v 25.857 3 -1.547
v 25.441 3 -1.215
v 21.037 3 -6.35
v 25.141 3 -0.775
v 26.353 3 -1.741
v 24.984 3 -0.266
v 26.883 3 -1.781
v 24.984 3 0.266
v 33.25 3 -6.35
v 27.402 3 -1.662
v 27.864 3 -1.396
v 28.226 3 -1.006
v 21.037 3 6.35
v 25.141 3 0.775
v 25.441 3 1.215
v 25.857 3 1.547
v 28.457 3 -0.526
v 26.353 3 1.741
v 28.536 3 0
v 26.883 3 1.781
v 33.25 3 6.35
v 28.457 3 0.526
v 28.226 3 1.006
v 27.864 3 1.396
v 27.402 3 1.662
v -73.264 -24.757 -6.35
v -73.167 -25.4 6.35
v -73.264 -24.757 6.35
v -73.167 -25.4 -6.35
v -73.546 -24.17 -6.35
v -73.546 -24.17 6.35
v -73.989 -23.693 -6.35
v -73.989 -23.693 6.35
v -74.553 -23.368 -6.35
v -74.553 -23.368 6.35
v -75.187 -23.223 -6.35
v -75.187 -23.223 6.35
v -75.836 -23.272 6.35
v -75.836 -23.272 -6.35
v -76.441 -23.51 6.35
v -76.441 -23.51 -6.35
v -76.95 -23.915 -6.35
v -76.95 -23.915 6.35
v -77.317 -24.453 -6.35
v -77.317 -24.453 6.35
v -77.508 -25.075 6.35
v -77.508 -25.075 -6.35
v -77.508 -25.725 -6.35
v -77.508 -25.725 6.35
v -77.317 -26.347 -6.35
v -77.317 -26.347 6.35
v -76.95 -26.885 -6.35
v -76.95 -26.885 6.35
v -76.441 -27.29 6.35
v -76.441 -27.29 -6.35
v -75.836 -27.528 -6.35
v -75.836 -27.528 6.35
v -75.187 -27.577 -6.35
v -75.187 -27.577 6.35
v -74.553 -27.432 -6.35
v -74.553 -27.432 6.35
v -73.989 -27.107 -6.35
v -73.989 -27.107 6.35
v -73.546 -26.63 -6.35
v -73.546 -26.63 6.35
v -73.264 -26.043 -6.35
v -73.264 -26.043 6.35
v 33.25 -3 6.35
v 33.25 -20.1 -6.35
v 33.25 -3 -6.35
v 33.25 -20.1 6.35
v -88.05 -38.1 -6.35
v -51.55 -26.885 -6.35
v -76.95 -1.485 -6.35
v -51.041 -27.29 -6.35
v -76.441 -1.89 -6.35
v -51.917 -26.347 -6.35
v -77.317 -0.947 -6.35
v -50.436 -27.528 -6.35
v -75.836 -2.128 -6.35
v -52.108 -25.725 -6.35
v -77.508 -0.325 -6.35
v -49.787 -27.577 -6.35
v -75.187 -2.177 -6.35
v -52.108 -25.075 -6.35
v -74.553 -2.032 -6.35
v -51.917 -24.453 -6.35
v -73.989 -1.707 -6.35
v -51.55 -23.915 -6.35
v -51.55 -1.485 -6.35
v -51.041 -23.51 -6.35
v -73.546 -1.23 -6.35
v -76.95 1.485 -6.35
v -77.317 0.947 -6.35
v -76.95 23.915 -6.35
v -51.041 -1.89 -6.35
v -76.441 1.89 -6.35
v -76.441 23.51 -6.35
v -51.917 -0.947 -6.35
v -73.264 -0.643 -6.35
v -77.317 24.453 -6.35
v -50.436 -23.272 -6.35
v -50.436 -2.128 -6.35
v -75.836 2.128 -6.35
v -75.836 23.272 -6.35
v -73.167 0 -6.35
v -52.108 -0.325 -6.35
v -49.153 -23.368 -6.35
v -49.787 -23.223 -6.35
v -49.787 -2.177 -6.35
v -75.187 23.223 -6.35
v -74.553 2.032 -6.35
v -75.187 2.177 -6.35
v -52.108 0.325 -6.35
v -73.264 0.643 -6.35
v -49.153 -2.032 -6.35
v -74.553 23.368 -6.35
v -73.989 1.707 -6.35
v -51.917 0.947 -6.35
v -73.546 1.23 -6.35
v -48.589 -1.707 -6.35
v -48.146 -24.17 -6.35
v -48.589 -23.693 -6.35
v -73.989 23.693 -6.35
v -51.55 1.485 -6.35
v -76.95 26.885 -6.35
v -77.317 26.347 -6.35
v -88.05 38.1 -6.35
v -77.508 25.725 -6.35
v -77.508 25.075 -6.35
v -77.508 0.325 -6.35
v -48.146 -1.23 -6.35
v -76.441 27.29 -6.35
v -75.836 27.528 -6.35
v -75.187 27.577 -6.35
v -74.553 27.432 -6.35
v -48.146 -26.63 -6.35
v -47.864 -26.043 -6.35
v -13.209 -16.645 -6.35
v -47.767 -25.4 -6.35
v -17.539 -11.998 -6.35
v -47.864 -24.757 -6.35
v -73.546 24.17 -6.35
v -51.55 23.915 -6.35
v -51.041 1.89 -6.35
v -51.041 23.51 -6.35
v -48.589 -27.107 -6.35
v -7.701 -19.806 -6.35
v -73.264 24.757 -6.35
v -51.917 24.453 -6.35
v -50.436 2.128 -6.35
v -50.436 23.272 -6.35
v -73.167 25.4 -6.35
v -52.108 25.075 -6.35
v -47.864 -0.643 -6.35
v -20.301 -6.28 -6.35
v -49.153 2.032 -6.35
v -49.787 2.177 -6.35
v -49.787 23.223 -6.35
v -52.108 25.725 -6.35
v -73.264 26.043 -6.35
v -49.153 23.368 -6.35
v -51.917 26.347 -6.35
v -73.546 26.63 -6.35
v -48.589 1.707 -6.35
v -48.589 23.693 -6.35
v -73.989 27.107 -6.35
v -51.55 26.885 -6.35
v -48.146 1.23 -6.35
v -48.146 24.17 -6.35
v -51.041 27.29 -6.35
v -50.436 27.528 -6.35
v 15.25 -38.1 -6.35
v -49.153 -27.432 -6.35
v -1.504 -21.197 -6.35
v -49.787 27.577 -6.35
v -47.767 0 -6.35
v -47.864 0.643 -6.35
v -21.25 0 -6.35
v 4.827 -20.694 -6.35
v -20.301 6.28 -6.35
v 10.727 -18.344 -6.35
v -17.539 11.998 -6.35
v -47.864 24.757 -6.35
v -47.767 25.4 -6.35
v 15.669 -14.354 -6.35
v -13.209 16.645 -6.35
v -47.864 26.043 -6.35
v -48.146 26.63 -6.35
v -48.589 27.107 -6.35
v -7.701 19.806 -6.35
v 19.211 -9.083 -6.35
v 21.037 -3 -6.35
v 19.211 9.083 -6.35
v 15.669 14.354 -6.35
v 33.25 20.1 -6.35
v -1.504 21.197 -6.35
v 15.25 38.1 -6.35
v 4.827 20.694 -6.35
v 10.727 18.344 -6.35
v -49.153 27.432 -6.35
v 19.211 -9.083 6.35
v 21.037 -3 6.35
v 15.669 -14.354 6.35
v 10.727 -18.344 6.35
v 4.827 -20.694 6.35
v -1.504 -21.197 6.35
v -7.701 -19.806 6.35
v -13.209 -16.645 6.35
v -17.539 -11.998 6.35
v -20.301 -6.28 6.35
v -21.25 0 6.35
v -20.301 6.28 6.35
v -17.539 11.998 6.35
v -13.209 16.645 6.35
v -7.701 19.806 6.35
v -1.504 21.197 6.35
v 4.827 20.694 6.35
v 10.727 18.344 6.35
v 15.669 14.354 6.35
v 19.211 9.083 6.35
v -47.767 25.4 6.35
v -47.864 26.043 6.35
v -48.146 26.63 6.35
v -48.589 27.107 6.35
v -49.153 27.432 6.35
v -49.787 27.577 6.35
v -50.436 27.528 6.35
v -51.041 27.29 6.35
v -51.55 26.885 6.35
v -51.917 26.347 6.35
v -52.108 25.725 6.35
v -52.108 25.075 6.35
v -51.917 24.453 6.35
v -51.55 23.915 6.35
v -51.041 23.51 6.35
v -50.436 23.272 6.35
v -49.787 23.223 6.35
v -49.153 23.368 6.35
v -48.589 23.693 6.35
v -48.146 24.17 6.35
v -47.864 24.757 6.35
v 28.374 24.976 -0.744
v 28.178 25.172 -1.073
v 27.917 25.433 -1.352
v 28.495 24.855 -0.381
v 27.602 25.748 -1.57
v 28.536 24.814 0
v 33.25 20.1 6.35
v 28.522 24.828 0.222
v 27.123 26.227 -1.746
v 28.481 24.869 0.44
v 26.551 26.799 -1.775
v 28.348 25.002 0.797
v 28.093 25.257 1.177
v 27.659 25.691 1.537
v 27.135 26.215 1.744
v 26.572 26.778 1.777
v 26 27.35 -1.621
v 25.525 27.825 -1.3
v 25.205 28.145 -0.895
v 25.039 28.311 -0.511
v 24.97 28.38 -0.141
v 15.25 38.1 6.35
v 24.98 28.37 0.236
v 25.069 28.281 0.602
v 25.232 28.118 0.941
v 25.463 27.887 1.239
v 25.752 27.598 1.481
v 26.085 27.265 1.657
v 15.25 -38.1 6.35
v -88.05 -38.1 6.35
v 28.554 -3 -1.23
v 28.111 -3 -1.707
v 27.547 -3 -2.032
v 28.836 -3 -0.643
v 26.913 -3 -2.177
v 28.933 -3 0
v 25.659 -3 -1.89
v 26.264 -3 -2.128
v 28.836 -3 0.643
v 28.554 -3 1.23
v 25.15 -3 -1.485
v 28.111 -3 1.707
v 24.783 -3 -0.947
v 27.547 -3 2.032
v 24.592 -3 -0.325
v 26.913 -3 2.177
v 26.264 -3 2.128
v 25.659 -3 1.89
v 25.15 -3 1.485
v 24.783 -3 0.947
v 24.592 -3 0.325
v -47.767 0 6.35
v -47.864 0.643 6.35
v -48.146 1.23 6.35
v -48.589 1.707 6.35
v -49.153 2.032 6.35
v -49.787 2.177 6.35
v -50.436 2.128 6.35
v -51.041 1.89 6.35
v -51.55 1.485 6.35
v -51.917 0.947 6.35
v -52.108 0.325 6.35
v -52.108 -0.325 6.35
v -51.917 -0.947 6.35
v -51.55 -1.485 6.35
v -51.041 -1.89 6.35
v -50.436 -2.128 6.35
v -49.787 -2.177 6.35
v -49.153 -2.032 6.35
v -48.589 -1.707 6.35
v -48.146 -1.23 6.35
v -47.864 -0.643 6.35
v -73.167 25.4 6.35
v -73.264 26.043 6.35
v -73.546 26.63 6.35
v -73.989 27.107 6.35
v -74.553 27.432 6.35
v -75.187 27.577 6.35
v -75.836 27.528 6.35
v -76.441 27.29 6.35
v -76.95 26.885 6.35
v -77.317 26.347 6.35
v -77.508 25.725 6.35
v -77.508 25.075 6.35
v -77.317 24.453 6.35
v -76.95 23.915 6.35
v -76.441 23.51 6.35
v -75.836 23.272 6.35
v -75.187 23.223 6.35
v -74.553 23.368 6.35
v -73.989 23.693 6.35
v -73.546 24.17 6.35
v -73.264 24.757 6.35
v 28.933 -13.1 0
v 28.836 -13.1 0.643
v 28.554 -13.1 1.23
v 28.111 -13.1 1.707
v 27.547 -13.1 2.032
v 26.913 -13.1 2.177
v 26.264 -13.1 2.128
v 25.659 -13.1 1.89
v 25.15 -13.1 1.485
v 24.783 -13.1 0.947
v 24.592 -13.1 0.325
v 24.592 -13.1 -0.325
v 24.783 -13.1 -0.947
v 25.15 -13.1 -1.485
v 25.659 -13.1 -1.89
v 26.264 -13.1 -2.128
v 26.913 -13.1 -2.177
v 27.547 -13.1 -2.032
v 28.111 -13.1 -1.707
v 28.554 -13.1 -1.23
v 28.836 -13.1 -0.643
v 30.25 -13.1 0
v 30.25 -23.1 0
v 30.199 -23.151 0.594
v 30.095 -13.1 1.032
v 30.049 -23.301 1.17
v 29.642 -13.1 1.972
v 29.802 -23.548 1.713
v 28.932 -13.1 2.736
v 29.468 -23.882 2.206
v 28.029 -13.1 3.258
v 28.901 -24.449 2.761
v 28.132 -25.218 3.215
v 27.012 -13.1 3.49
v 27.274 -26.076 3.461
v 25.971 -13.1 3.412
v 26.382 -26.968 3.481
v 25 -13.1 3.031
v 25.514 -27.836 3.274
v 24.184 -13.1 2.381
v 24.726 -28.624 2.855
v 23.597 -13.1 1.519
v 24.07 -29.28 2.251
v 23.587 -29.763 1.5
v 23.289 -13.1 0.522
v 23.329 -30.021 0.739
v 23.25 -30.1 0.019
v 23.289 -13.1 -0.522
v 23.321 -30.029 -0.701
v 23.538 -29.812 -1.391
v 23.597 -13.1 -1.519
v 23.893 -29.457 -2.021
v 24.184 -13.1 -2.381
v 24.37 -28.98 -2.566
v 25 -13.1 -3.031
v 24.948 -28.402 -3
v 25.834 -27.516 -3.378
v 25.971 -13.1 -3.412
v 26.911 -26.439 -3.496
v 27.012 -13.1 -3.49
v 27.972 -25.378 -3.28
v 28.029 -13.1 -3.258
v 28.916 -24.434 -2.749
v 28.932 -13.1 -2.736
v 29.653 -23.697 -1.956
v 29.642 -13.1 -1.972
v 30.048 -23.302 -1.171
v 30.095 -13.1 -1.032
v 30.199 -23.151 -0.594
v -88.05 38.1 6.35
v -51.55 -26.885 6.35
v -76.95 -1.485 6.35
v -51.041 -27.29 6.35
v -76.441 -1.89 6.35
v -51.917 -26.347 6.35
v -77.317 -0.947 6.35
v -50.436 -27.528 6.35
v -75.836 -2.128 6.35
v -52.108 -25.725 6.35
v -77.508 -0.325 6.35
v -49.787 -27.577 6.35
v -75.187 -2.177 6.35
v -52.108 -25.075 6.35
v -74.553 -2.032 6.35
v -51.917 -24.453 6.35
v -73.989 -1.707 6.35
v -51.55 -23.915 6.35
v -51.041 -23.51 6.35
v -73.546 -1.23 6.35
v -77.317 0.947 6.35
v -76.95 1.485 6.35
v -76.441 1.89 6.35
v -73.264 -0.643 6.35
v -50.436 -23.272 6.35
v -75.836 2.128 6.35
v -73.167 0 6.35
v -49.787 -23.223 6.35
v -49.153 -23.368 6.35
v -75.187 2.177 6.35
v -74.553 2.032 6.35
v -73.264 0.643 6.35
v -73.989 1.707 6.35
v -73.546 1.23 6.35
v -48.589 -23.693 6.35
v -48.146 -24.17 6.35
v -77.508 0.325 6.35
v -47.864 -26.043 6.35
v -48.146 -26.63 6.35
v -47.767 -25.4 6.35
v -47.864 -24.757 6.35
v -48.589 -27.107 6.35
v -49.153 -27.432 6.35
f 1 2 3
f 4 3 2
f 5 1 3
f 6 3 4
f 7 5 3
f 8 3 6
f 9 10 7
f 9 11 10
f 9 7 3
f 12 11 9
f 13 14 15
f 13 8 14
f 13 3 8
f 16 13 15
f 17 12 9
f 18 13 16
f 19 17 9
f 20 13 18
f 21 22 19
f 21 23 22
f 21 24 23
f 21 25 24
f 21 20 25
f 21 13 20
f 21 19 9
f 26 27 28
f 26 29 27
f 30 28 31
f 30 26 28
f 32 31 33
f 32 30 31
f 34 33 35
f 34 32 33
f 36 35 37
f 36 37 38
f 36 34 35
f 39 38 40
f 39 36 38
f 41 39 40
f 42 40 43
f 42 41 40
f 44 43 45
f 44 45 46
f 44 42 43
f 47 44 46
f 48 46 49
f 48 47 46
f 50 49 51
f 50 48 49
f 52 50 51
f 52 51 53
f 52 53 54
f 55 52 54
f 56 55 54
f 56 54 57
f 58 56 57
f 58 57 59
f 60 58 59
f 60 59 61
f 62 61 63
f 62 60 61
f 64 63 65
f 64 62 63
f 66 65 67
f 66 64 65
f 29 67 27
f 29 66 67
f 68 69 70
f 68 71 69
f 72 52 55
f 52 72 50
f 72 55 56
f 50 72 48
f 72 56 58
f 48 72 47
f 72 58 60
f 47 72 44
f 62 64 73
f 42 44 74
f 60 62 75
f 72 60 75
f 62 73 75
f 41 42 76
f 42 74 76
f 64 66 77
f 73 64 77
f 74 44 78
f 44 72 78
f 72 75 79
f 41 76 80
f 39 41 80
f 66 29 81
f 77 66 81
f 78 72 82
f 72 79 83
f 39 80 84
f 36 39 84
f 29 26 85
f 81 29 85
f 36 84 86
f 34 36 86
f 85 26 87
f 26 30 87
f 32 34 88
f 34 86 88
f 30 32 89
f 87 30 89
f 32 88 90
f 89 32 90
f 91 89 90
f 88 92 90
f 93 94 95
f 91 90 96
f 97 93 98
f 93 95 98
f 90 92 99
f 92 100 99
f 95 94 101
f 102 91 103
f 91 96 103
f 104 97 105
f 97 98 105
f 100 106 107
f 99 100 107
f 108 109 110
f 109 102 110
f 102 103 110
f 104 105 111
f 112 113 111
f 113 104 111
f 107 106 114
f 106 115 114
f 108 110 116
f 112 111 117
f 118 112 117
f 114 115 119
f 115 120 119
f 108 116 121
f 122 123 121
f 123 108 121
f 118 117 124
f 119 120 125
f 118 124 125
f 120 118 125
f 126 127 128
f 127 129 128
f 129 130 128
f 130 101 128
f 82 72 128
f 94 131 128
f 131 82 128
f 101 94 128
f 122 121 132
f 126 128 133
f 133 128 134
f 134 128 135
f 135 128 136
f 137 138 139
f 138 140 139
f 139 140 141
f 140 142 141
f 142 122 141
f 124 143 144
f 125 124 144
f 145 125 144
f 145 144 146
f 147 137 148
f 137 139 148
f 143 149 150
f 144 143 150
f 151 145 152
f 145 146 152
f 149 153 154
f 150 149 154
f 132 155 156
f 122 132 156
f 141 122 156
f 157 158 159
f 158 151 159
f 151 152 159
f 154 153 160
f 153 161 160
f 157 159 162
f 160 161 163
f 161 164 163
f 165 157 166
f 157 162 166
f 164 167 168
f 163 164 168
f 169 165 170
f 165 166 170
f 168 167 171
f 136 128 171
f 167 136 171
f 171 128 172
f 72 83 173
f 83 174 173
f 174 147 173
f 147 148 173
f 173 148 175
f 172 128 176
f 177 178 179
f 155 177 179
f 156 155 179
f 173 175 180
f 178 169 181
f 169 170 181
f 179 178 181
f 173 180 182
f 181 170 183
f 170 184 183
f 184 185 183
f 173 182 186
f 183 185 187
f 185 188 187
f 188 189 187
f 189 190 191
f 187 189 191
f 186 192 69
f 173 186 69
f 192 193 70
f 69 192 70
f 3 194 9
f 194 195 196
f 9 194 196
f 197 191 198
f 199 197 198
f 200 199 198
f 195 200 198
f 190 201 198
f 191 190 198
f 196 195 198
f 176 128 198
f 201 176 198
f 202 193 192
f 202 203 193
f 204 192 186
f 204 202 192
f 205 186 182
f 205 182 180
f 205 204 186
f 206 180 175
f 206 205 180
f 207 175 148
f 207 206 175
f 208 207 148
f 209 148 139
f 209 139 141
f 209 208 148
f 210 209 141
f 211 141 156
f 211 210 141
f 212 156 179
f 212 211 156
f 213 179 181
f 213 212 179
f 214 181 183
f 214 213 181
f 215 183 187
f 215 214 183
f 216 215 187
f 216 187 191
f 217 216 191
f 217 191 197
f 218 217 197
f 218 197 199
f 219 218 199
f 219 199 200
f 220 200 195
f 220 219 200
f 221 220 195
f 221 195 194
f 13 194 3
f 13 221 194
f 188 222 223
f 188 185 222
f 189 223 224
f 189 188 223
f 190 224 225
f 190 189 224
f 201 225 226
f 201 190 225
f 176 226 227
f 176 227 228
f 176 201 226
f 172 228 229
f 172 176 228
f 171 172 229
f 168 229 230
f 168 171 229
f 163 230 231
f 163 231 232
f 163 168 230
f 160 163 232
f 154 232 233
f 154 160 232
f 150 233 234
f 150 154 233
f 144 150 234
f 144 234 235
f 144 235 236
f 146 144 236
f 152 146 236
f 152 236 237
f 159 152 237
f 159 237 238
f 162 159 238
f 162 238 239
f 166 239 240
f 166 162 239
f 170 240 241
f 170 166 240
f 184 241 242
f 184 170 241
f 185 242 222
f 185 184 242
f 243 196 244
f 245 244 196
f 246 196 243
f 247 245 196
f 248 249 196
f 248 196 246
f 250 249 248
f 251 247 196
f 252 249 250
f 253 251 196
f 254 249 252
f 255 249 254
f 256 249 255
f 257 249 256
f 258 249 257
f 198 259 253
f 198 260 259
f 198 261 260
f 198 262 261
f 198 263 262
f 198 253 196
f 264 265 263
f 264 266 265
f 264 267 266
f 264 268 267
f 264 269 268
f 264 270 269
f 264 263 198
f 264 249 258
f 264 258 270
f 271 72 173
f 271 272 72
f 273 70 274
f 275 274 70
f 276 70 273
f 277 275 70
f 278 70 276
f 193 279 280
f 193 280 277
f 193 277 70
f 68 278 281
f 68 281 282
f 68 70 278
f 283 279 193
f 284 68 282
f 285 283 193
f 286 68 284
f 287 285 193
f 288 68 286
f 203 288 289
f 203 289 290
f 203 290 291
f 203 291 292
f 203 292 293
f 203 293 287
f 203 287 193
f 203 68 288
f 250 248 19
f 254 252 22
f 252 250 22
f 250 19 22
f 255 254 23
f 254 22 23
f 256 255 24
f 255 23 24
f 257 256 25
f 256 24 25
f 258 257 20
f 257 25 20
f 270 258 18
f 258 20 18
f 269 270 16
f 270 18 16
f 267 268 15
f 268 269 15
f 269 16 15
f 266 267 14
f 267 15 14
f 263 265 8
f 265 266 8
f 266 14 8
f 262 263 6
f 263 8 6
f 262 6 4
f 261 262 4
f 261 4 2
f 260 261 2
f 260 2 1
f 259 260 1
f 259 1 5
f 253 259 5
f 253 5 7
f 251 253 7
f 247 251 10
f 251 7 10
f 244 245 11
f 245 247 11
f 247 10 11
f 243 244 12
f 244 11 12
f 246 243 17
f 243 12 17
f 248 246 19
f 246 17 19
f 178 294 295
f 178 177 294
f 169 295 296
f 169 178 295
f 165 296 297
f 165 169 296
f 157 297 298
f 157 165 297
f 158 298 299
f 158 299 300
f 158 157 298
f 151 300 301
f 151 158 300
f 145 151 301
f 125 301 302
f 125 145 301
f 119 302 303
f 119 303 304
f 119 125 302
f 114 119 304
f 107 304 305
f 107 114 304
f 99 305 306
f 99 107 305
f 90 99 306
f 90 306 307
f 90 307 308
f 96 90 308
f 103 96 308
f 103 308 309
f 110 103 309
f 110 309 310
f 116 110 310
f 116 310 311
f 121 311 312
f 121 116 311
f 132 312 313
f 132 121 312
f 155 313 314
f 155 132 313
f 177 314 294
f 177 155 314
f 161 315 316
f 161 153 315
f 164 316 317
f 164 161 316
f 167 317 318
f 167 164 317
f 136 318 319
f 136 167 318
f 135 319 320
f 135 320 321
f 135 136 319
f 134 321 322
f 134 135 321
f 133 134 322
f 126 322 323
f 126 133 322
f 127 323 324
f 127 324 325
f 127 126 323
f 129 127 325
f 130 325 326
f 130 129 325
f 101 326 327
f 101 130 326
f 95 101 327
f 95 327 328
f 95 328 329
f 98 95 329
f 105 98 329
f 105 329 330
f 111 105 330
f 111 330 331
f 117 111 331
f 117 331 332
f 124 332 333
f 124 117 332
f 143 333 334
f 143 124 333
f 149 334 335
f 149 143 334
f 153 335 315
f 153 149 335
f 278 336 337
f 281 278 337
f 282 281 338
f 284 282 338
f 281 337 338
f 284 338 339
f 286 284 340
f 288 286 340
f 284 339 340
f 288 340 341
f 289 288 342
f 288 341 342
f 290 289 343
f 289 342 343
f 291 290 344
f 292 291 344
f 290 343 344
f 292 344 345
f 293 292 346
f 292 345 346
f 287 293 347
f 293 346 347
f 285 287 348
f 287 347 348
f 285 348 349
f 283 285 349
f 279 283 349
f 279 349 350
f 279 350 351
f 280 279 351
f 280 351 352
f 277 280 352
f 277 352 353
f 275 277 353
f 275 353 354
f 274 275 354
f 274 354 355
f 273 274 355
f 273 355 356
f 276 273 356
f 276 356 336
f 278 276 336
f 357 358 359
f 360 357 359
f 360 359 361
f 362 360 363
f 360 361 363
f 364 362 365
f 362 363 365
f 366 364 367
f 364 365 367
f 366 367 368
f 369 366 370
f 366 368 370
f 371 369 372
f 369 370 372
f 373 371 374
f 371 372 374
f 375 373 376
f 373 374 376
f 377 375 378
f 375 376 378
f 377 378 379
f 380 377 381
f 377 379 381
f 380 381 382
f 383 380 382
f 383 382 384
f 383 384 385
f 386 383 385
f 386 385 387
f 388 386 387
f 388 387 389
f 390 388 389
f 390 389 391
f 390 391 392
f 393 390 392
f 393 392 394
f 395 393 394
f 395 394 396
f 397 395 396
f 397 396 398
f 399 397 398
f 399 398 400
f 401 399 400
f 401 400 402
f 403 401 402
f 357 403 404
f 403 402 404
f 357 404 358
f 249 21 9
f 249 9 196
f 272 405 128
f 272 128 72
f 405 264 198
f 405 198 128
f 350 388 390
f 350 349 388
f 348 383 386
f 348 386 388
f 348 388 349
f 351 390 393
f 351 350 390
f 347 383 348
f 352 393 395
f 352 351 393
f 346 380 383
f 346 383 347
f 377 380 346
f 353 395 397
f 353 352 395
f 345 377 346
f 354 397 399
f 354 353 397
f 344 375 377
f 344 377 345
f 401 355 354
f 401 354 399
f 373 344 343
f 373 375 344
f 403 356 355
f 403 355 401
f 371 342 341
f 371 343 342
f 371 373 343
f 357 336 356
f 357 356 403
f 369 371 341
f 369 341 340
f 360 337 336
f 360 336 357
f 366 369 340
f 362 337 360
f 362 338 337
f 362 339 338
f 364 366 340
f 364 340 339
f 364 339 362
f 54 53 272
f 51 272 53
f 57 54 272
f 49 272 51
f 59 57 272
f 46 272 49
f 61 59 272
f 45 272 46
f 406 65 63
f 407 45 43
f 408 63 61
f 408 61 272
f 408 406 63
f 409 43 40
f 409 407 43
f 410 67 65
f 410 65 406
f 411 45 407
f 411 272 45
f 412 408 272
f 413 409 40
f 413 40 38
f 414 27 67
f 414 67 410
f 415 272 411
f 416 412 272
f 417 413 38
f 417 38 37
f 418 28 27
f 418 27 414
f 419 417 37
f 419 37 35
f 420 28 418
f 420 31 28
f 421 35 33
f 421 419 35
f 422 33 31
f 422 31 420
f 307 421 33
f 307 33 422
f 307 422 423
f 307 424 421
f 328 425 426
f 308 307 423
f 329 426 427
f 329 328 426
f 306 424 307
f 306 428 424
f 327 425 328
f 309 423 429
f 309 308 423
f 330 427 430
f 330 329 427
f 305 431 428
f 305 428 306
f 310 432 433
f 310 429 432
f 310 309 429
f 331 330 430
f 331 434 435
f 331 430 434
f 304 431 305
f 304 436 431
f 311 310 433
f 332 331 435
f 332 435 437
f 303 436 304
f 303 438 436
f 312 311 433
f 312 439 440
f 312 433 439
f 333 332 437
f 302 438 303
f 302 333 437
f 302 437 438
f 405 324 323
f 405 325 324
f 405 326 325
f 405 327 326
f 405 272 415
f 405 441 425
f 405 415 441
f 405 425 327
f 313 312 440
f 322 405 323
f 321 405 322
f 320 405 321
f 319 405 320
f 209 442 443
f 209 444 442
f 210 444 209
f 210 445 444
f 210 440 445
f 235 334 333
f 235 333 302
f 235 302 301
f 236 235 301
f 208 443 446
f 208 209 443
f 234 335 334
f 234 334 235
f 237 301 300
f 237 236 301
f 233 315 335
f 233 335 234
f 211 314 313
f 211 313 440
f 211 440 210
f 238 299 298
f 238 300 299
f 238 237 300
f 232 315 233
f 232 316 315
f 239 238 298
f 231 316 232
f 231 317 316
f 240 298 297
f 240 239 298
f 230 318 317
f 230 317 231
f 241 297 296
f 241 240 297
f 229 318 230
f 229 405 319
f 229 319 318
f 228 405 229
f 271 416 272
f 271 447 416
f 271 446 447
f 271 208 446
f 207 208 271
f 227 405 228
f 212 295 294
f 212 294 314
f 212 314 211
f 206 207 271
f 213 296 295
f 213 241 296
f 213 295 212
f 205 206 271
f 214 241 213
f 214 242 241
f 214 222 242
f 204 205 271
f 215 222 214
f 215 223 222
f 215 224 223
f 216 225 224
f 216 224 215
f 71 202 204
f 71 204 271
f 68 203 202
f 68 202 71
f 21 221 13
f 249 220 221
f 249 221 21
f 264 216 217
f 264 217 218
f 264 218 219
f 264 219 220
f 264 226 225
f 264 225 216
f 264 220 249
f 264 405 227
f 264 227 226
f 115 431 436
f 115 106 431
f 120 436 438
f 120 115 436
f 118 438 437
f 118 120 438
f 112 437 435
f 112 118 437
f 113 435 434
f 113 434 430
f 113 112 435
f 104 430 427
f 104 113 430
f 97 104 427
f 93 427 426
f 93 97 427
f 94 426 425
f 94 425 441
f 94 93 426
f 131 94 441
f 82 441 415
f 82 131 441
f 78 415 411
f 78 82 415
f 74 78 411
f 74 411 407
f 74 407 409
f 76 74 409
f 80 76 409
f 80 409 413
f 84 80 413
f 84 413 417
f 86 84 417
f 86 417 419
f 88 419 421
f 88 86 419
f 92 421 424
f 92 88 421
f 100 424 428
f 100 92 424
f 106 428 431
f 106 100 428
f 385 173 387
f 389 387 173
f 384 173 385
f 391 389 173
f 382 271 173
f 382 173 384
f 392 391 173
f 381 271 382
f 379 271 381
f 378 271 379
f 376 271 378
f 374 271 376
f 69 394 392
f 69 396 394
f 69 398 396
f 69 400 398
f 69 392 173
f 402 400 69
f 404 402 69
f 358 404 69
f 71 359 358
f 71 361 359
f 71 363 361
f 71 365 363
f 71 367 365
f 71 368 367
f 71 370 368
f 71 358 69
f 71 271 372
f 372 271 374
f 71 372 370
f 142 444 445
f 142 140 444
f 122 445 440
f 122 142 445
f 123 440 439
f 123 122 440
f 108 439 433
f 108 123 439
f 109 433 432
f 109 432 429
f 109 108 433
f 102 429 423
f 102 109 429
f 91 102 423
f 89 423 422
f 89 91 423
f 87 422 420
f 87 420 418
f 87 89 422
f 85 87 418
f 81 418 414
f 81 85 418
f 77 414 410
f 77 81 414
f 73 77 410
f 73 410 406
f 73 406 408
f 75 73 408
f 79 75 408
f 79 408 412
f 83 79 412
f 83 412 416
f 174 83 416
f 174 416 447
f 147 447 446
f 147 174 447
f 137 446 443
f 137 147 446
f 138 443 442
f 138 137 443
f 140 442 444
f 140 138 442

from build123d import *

# Parameters (mm, degrees)
F0_R     = 2.182812
F0_R_2   = 2.182813
F1_DEPTH = 6.35
F2_R     = 3.5
F2_R_2   = 2.182813
F3_DEPTH = 25
F2_R_3   = 1.785938
F4_DEPTH = 35.1
F5_DEPTH = 76.2


with BuildPart() as f1:
    # F0 (on Top) → F1 (new body, symmetric)
    with BuildSketch(Plane.XY):
        with BuildLine():
            ThreePointArc((21.037169, -3), (-21.25, 0), (21.037169, 3))
            Line((21.037169, 3), (33.25, 3))
            Line((33.25, 3), (33.25, 20.1))
            Line((33.25, 20.1), (15.25, 38.1))
            Line((15.25, 38.1), (-88.05, 38.1))
            Line((-88.05, 38.1), (-88.05, -38.1))
            Line((-88.05, -38.1), (15.25, -38.1))
            Line((15.25, -38.1), (33.25, -20.1))
            Line((33.25, -20.1), (33.25, -3))
            Line((33.25, -3), (21.037169, -3))
        make_face()
        with Locations((-75.35, -25.4)):
            Circle(F0_R, mode=Mode.SUBTRACT)
        with Locations((-49.95, -25.4)):
            Circle(F0_R_2, mode=Mode.SUBTRACT)
        with Locations((-75.35, 0)):
            Circle(F0_R, mode=Mode.SUBTRACT)
        with Locations((-49.95, 0)):
            Circle(F0_R_2, mode=Mode.SUBTRACT)
        with Locations((-75.35, 25.4)):
            Circle(F0_R_2, mode=Mode.SUBTRACT)
        with Locations((-49.95, 25.4)):
            Circle(F0_R_2, mode=Mode.SUBTRACT)
    extrude(amount=F1_DEPTH, both=True)

    # F2 (on face) → F3 (cut)
    with BuildSketch(Plane.XZ.offset(38.1)):
        with Locations((26.75, 0)):
            Circle(F2_R)
        with Locations((26.75, 0)):
            Circle(F2_R_2, mode=Mode.SUBTRACT)
    extrude(amount=-F3_DEPTH, mode=Mode.SUBTRACT)

    # F2 (on face) → F4 (cut, through all)
    with BuildSketch(Plane.XZ.offset(38.1)):
        with Locations((26.75, 0)):
            Circle(F2_R_2)
        with Locations((26.75, 0)):
            Circle(F2_R_3, mode=Mode.SUBTRACT)
        with Locations((26.75, 0)):
            Circle(F2_R_3)
    extrude(amount=-F4_DEPTH, mode=Mode.SUBTRACT)

    # F2 (on face) → F5 (cut, through all)
    with BuildSketch(Plane.XZ.offset(38.1)):
        with Locations((26.75, 0)):
            Circle(F2_R_3)
    extrude(amount=-F5_DEPTH, mode=Mode.SUBTRACT)


solid = f1.part
